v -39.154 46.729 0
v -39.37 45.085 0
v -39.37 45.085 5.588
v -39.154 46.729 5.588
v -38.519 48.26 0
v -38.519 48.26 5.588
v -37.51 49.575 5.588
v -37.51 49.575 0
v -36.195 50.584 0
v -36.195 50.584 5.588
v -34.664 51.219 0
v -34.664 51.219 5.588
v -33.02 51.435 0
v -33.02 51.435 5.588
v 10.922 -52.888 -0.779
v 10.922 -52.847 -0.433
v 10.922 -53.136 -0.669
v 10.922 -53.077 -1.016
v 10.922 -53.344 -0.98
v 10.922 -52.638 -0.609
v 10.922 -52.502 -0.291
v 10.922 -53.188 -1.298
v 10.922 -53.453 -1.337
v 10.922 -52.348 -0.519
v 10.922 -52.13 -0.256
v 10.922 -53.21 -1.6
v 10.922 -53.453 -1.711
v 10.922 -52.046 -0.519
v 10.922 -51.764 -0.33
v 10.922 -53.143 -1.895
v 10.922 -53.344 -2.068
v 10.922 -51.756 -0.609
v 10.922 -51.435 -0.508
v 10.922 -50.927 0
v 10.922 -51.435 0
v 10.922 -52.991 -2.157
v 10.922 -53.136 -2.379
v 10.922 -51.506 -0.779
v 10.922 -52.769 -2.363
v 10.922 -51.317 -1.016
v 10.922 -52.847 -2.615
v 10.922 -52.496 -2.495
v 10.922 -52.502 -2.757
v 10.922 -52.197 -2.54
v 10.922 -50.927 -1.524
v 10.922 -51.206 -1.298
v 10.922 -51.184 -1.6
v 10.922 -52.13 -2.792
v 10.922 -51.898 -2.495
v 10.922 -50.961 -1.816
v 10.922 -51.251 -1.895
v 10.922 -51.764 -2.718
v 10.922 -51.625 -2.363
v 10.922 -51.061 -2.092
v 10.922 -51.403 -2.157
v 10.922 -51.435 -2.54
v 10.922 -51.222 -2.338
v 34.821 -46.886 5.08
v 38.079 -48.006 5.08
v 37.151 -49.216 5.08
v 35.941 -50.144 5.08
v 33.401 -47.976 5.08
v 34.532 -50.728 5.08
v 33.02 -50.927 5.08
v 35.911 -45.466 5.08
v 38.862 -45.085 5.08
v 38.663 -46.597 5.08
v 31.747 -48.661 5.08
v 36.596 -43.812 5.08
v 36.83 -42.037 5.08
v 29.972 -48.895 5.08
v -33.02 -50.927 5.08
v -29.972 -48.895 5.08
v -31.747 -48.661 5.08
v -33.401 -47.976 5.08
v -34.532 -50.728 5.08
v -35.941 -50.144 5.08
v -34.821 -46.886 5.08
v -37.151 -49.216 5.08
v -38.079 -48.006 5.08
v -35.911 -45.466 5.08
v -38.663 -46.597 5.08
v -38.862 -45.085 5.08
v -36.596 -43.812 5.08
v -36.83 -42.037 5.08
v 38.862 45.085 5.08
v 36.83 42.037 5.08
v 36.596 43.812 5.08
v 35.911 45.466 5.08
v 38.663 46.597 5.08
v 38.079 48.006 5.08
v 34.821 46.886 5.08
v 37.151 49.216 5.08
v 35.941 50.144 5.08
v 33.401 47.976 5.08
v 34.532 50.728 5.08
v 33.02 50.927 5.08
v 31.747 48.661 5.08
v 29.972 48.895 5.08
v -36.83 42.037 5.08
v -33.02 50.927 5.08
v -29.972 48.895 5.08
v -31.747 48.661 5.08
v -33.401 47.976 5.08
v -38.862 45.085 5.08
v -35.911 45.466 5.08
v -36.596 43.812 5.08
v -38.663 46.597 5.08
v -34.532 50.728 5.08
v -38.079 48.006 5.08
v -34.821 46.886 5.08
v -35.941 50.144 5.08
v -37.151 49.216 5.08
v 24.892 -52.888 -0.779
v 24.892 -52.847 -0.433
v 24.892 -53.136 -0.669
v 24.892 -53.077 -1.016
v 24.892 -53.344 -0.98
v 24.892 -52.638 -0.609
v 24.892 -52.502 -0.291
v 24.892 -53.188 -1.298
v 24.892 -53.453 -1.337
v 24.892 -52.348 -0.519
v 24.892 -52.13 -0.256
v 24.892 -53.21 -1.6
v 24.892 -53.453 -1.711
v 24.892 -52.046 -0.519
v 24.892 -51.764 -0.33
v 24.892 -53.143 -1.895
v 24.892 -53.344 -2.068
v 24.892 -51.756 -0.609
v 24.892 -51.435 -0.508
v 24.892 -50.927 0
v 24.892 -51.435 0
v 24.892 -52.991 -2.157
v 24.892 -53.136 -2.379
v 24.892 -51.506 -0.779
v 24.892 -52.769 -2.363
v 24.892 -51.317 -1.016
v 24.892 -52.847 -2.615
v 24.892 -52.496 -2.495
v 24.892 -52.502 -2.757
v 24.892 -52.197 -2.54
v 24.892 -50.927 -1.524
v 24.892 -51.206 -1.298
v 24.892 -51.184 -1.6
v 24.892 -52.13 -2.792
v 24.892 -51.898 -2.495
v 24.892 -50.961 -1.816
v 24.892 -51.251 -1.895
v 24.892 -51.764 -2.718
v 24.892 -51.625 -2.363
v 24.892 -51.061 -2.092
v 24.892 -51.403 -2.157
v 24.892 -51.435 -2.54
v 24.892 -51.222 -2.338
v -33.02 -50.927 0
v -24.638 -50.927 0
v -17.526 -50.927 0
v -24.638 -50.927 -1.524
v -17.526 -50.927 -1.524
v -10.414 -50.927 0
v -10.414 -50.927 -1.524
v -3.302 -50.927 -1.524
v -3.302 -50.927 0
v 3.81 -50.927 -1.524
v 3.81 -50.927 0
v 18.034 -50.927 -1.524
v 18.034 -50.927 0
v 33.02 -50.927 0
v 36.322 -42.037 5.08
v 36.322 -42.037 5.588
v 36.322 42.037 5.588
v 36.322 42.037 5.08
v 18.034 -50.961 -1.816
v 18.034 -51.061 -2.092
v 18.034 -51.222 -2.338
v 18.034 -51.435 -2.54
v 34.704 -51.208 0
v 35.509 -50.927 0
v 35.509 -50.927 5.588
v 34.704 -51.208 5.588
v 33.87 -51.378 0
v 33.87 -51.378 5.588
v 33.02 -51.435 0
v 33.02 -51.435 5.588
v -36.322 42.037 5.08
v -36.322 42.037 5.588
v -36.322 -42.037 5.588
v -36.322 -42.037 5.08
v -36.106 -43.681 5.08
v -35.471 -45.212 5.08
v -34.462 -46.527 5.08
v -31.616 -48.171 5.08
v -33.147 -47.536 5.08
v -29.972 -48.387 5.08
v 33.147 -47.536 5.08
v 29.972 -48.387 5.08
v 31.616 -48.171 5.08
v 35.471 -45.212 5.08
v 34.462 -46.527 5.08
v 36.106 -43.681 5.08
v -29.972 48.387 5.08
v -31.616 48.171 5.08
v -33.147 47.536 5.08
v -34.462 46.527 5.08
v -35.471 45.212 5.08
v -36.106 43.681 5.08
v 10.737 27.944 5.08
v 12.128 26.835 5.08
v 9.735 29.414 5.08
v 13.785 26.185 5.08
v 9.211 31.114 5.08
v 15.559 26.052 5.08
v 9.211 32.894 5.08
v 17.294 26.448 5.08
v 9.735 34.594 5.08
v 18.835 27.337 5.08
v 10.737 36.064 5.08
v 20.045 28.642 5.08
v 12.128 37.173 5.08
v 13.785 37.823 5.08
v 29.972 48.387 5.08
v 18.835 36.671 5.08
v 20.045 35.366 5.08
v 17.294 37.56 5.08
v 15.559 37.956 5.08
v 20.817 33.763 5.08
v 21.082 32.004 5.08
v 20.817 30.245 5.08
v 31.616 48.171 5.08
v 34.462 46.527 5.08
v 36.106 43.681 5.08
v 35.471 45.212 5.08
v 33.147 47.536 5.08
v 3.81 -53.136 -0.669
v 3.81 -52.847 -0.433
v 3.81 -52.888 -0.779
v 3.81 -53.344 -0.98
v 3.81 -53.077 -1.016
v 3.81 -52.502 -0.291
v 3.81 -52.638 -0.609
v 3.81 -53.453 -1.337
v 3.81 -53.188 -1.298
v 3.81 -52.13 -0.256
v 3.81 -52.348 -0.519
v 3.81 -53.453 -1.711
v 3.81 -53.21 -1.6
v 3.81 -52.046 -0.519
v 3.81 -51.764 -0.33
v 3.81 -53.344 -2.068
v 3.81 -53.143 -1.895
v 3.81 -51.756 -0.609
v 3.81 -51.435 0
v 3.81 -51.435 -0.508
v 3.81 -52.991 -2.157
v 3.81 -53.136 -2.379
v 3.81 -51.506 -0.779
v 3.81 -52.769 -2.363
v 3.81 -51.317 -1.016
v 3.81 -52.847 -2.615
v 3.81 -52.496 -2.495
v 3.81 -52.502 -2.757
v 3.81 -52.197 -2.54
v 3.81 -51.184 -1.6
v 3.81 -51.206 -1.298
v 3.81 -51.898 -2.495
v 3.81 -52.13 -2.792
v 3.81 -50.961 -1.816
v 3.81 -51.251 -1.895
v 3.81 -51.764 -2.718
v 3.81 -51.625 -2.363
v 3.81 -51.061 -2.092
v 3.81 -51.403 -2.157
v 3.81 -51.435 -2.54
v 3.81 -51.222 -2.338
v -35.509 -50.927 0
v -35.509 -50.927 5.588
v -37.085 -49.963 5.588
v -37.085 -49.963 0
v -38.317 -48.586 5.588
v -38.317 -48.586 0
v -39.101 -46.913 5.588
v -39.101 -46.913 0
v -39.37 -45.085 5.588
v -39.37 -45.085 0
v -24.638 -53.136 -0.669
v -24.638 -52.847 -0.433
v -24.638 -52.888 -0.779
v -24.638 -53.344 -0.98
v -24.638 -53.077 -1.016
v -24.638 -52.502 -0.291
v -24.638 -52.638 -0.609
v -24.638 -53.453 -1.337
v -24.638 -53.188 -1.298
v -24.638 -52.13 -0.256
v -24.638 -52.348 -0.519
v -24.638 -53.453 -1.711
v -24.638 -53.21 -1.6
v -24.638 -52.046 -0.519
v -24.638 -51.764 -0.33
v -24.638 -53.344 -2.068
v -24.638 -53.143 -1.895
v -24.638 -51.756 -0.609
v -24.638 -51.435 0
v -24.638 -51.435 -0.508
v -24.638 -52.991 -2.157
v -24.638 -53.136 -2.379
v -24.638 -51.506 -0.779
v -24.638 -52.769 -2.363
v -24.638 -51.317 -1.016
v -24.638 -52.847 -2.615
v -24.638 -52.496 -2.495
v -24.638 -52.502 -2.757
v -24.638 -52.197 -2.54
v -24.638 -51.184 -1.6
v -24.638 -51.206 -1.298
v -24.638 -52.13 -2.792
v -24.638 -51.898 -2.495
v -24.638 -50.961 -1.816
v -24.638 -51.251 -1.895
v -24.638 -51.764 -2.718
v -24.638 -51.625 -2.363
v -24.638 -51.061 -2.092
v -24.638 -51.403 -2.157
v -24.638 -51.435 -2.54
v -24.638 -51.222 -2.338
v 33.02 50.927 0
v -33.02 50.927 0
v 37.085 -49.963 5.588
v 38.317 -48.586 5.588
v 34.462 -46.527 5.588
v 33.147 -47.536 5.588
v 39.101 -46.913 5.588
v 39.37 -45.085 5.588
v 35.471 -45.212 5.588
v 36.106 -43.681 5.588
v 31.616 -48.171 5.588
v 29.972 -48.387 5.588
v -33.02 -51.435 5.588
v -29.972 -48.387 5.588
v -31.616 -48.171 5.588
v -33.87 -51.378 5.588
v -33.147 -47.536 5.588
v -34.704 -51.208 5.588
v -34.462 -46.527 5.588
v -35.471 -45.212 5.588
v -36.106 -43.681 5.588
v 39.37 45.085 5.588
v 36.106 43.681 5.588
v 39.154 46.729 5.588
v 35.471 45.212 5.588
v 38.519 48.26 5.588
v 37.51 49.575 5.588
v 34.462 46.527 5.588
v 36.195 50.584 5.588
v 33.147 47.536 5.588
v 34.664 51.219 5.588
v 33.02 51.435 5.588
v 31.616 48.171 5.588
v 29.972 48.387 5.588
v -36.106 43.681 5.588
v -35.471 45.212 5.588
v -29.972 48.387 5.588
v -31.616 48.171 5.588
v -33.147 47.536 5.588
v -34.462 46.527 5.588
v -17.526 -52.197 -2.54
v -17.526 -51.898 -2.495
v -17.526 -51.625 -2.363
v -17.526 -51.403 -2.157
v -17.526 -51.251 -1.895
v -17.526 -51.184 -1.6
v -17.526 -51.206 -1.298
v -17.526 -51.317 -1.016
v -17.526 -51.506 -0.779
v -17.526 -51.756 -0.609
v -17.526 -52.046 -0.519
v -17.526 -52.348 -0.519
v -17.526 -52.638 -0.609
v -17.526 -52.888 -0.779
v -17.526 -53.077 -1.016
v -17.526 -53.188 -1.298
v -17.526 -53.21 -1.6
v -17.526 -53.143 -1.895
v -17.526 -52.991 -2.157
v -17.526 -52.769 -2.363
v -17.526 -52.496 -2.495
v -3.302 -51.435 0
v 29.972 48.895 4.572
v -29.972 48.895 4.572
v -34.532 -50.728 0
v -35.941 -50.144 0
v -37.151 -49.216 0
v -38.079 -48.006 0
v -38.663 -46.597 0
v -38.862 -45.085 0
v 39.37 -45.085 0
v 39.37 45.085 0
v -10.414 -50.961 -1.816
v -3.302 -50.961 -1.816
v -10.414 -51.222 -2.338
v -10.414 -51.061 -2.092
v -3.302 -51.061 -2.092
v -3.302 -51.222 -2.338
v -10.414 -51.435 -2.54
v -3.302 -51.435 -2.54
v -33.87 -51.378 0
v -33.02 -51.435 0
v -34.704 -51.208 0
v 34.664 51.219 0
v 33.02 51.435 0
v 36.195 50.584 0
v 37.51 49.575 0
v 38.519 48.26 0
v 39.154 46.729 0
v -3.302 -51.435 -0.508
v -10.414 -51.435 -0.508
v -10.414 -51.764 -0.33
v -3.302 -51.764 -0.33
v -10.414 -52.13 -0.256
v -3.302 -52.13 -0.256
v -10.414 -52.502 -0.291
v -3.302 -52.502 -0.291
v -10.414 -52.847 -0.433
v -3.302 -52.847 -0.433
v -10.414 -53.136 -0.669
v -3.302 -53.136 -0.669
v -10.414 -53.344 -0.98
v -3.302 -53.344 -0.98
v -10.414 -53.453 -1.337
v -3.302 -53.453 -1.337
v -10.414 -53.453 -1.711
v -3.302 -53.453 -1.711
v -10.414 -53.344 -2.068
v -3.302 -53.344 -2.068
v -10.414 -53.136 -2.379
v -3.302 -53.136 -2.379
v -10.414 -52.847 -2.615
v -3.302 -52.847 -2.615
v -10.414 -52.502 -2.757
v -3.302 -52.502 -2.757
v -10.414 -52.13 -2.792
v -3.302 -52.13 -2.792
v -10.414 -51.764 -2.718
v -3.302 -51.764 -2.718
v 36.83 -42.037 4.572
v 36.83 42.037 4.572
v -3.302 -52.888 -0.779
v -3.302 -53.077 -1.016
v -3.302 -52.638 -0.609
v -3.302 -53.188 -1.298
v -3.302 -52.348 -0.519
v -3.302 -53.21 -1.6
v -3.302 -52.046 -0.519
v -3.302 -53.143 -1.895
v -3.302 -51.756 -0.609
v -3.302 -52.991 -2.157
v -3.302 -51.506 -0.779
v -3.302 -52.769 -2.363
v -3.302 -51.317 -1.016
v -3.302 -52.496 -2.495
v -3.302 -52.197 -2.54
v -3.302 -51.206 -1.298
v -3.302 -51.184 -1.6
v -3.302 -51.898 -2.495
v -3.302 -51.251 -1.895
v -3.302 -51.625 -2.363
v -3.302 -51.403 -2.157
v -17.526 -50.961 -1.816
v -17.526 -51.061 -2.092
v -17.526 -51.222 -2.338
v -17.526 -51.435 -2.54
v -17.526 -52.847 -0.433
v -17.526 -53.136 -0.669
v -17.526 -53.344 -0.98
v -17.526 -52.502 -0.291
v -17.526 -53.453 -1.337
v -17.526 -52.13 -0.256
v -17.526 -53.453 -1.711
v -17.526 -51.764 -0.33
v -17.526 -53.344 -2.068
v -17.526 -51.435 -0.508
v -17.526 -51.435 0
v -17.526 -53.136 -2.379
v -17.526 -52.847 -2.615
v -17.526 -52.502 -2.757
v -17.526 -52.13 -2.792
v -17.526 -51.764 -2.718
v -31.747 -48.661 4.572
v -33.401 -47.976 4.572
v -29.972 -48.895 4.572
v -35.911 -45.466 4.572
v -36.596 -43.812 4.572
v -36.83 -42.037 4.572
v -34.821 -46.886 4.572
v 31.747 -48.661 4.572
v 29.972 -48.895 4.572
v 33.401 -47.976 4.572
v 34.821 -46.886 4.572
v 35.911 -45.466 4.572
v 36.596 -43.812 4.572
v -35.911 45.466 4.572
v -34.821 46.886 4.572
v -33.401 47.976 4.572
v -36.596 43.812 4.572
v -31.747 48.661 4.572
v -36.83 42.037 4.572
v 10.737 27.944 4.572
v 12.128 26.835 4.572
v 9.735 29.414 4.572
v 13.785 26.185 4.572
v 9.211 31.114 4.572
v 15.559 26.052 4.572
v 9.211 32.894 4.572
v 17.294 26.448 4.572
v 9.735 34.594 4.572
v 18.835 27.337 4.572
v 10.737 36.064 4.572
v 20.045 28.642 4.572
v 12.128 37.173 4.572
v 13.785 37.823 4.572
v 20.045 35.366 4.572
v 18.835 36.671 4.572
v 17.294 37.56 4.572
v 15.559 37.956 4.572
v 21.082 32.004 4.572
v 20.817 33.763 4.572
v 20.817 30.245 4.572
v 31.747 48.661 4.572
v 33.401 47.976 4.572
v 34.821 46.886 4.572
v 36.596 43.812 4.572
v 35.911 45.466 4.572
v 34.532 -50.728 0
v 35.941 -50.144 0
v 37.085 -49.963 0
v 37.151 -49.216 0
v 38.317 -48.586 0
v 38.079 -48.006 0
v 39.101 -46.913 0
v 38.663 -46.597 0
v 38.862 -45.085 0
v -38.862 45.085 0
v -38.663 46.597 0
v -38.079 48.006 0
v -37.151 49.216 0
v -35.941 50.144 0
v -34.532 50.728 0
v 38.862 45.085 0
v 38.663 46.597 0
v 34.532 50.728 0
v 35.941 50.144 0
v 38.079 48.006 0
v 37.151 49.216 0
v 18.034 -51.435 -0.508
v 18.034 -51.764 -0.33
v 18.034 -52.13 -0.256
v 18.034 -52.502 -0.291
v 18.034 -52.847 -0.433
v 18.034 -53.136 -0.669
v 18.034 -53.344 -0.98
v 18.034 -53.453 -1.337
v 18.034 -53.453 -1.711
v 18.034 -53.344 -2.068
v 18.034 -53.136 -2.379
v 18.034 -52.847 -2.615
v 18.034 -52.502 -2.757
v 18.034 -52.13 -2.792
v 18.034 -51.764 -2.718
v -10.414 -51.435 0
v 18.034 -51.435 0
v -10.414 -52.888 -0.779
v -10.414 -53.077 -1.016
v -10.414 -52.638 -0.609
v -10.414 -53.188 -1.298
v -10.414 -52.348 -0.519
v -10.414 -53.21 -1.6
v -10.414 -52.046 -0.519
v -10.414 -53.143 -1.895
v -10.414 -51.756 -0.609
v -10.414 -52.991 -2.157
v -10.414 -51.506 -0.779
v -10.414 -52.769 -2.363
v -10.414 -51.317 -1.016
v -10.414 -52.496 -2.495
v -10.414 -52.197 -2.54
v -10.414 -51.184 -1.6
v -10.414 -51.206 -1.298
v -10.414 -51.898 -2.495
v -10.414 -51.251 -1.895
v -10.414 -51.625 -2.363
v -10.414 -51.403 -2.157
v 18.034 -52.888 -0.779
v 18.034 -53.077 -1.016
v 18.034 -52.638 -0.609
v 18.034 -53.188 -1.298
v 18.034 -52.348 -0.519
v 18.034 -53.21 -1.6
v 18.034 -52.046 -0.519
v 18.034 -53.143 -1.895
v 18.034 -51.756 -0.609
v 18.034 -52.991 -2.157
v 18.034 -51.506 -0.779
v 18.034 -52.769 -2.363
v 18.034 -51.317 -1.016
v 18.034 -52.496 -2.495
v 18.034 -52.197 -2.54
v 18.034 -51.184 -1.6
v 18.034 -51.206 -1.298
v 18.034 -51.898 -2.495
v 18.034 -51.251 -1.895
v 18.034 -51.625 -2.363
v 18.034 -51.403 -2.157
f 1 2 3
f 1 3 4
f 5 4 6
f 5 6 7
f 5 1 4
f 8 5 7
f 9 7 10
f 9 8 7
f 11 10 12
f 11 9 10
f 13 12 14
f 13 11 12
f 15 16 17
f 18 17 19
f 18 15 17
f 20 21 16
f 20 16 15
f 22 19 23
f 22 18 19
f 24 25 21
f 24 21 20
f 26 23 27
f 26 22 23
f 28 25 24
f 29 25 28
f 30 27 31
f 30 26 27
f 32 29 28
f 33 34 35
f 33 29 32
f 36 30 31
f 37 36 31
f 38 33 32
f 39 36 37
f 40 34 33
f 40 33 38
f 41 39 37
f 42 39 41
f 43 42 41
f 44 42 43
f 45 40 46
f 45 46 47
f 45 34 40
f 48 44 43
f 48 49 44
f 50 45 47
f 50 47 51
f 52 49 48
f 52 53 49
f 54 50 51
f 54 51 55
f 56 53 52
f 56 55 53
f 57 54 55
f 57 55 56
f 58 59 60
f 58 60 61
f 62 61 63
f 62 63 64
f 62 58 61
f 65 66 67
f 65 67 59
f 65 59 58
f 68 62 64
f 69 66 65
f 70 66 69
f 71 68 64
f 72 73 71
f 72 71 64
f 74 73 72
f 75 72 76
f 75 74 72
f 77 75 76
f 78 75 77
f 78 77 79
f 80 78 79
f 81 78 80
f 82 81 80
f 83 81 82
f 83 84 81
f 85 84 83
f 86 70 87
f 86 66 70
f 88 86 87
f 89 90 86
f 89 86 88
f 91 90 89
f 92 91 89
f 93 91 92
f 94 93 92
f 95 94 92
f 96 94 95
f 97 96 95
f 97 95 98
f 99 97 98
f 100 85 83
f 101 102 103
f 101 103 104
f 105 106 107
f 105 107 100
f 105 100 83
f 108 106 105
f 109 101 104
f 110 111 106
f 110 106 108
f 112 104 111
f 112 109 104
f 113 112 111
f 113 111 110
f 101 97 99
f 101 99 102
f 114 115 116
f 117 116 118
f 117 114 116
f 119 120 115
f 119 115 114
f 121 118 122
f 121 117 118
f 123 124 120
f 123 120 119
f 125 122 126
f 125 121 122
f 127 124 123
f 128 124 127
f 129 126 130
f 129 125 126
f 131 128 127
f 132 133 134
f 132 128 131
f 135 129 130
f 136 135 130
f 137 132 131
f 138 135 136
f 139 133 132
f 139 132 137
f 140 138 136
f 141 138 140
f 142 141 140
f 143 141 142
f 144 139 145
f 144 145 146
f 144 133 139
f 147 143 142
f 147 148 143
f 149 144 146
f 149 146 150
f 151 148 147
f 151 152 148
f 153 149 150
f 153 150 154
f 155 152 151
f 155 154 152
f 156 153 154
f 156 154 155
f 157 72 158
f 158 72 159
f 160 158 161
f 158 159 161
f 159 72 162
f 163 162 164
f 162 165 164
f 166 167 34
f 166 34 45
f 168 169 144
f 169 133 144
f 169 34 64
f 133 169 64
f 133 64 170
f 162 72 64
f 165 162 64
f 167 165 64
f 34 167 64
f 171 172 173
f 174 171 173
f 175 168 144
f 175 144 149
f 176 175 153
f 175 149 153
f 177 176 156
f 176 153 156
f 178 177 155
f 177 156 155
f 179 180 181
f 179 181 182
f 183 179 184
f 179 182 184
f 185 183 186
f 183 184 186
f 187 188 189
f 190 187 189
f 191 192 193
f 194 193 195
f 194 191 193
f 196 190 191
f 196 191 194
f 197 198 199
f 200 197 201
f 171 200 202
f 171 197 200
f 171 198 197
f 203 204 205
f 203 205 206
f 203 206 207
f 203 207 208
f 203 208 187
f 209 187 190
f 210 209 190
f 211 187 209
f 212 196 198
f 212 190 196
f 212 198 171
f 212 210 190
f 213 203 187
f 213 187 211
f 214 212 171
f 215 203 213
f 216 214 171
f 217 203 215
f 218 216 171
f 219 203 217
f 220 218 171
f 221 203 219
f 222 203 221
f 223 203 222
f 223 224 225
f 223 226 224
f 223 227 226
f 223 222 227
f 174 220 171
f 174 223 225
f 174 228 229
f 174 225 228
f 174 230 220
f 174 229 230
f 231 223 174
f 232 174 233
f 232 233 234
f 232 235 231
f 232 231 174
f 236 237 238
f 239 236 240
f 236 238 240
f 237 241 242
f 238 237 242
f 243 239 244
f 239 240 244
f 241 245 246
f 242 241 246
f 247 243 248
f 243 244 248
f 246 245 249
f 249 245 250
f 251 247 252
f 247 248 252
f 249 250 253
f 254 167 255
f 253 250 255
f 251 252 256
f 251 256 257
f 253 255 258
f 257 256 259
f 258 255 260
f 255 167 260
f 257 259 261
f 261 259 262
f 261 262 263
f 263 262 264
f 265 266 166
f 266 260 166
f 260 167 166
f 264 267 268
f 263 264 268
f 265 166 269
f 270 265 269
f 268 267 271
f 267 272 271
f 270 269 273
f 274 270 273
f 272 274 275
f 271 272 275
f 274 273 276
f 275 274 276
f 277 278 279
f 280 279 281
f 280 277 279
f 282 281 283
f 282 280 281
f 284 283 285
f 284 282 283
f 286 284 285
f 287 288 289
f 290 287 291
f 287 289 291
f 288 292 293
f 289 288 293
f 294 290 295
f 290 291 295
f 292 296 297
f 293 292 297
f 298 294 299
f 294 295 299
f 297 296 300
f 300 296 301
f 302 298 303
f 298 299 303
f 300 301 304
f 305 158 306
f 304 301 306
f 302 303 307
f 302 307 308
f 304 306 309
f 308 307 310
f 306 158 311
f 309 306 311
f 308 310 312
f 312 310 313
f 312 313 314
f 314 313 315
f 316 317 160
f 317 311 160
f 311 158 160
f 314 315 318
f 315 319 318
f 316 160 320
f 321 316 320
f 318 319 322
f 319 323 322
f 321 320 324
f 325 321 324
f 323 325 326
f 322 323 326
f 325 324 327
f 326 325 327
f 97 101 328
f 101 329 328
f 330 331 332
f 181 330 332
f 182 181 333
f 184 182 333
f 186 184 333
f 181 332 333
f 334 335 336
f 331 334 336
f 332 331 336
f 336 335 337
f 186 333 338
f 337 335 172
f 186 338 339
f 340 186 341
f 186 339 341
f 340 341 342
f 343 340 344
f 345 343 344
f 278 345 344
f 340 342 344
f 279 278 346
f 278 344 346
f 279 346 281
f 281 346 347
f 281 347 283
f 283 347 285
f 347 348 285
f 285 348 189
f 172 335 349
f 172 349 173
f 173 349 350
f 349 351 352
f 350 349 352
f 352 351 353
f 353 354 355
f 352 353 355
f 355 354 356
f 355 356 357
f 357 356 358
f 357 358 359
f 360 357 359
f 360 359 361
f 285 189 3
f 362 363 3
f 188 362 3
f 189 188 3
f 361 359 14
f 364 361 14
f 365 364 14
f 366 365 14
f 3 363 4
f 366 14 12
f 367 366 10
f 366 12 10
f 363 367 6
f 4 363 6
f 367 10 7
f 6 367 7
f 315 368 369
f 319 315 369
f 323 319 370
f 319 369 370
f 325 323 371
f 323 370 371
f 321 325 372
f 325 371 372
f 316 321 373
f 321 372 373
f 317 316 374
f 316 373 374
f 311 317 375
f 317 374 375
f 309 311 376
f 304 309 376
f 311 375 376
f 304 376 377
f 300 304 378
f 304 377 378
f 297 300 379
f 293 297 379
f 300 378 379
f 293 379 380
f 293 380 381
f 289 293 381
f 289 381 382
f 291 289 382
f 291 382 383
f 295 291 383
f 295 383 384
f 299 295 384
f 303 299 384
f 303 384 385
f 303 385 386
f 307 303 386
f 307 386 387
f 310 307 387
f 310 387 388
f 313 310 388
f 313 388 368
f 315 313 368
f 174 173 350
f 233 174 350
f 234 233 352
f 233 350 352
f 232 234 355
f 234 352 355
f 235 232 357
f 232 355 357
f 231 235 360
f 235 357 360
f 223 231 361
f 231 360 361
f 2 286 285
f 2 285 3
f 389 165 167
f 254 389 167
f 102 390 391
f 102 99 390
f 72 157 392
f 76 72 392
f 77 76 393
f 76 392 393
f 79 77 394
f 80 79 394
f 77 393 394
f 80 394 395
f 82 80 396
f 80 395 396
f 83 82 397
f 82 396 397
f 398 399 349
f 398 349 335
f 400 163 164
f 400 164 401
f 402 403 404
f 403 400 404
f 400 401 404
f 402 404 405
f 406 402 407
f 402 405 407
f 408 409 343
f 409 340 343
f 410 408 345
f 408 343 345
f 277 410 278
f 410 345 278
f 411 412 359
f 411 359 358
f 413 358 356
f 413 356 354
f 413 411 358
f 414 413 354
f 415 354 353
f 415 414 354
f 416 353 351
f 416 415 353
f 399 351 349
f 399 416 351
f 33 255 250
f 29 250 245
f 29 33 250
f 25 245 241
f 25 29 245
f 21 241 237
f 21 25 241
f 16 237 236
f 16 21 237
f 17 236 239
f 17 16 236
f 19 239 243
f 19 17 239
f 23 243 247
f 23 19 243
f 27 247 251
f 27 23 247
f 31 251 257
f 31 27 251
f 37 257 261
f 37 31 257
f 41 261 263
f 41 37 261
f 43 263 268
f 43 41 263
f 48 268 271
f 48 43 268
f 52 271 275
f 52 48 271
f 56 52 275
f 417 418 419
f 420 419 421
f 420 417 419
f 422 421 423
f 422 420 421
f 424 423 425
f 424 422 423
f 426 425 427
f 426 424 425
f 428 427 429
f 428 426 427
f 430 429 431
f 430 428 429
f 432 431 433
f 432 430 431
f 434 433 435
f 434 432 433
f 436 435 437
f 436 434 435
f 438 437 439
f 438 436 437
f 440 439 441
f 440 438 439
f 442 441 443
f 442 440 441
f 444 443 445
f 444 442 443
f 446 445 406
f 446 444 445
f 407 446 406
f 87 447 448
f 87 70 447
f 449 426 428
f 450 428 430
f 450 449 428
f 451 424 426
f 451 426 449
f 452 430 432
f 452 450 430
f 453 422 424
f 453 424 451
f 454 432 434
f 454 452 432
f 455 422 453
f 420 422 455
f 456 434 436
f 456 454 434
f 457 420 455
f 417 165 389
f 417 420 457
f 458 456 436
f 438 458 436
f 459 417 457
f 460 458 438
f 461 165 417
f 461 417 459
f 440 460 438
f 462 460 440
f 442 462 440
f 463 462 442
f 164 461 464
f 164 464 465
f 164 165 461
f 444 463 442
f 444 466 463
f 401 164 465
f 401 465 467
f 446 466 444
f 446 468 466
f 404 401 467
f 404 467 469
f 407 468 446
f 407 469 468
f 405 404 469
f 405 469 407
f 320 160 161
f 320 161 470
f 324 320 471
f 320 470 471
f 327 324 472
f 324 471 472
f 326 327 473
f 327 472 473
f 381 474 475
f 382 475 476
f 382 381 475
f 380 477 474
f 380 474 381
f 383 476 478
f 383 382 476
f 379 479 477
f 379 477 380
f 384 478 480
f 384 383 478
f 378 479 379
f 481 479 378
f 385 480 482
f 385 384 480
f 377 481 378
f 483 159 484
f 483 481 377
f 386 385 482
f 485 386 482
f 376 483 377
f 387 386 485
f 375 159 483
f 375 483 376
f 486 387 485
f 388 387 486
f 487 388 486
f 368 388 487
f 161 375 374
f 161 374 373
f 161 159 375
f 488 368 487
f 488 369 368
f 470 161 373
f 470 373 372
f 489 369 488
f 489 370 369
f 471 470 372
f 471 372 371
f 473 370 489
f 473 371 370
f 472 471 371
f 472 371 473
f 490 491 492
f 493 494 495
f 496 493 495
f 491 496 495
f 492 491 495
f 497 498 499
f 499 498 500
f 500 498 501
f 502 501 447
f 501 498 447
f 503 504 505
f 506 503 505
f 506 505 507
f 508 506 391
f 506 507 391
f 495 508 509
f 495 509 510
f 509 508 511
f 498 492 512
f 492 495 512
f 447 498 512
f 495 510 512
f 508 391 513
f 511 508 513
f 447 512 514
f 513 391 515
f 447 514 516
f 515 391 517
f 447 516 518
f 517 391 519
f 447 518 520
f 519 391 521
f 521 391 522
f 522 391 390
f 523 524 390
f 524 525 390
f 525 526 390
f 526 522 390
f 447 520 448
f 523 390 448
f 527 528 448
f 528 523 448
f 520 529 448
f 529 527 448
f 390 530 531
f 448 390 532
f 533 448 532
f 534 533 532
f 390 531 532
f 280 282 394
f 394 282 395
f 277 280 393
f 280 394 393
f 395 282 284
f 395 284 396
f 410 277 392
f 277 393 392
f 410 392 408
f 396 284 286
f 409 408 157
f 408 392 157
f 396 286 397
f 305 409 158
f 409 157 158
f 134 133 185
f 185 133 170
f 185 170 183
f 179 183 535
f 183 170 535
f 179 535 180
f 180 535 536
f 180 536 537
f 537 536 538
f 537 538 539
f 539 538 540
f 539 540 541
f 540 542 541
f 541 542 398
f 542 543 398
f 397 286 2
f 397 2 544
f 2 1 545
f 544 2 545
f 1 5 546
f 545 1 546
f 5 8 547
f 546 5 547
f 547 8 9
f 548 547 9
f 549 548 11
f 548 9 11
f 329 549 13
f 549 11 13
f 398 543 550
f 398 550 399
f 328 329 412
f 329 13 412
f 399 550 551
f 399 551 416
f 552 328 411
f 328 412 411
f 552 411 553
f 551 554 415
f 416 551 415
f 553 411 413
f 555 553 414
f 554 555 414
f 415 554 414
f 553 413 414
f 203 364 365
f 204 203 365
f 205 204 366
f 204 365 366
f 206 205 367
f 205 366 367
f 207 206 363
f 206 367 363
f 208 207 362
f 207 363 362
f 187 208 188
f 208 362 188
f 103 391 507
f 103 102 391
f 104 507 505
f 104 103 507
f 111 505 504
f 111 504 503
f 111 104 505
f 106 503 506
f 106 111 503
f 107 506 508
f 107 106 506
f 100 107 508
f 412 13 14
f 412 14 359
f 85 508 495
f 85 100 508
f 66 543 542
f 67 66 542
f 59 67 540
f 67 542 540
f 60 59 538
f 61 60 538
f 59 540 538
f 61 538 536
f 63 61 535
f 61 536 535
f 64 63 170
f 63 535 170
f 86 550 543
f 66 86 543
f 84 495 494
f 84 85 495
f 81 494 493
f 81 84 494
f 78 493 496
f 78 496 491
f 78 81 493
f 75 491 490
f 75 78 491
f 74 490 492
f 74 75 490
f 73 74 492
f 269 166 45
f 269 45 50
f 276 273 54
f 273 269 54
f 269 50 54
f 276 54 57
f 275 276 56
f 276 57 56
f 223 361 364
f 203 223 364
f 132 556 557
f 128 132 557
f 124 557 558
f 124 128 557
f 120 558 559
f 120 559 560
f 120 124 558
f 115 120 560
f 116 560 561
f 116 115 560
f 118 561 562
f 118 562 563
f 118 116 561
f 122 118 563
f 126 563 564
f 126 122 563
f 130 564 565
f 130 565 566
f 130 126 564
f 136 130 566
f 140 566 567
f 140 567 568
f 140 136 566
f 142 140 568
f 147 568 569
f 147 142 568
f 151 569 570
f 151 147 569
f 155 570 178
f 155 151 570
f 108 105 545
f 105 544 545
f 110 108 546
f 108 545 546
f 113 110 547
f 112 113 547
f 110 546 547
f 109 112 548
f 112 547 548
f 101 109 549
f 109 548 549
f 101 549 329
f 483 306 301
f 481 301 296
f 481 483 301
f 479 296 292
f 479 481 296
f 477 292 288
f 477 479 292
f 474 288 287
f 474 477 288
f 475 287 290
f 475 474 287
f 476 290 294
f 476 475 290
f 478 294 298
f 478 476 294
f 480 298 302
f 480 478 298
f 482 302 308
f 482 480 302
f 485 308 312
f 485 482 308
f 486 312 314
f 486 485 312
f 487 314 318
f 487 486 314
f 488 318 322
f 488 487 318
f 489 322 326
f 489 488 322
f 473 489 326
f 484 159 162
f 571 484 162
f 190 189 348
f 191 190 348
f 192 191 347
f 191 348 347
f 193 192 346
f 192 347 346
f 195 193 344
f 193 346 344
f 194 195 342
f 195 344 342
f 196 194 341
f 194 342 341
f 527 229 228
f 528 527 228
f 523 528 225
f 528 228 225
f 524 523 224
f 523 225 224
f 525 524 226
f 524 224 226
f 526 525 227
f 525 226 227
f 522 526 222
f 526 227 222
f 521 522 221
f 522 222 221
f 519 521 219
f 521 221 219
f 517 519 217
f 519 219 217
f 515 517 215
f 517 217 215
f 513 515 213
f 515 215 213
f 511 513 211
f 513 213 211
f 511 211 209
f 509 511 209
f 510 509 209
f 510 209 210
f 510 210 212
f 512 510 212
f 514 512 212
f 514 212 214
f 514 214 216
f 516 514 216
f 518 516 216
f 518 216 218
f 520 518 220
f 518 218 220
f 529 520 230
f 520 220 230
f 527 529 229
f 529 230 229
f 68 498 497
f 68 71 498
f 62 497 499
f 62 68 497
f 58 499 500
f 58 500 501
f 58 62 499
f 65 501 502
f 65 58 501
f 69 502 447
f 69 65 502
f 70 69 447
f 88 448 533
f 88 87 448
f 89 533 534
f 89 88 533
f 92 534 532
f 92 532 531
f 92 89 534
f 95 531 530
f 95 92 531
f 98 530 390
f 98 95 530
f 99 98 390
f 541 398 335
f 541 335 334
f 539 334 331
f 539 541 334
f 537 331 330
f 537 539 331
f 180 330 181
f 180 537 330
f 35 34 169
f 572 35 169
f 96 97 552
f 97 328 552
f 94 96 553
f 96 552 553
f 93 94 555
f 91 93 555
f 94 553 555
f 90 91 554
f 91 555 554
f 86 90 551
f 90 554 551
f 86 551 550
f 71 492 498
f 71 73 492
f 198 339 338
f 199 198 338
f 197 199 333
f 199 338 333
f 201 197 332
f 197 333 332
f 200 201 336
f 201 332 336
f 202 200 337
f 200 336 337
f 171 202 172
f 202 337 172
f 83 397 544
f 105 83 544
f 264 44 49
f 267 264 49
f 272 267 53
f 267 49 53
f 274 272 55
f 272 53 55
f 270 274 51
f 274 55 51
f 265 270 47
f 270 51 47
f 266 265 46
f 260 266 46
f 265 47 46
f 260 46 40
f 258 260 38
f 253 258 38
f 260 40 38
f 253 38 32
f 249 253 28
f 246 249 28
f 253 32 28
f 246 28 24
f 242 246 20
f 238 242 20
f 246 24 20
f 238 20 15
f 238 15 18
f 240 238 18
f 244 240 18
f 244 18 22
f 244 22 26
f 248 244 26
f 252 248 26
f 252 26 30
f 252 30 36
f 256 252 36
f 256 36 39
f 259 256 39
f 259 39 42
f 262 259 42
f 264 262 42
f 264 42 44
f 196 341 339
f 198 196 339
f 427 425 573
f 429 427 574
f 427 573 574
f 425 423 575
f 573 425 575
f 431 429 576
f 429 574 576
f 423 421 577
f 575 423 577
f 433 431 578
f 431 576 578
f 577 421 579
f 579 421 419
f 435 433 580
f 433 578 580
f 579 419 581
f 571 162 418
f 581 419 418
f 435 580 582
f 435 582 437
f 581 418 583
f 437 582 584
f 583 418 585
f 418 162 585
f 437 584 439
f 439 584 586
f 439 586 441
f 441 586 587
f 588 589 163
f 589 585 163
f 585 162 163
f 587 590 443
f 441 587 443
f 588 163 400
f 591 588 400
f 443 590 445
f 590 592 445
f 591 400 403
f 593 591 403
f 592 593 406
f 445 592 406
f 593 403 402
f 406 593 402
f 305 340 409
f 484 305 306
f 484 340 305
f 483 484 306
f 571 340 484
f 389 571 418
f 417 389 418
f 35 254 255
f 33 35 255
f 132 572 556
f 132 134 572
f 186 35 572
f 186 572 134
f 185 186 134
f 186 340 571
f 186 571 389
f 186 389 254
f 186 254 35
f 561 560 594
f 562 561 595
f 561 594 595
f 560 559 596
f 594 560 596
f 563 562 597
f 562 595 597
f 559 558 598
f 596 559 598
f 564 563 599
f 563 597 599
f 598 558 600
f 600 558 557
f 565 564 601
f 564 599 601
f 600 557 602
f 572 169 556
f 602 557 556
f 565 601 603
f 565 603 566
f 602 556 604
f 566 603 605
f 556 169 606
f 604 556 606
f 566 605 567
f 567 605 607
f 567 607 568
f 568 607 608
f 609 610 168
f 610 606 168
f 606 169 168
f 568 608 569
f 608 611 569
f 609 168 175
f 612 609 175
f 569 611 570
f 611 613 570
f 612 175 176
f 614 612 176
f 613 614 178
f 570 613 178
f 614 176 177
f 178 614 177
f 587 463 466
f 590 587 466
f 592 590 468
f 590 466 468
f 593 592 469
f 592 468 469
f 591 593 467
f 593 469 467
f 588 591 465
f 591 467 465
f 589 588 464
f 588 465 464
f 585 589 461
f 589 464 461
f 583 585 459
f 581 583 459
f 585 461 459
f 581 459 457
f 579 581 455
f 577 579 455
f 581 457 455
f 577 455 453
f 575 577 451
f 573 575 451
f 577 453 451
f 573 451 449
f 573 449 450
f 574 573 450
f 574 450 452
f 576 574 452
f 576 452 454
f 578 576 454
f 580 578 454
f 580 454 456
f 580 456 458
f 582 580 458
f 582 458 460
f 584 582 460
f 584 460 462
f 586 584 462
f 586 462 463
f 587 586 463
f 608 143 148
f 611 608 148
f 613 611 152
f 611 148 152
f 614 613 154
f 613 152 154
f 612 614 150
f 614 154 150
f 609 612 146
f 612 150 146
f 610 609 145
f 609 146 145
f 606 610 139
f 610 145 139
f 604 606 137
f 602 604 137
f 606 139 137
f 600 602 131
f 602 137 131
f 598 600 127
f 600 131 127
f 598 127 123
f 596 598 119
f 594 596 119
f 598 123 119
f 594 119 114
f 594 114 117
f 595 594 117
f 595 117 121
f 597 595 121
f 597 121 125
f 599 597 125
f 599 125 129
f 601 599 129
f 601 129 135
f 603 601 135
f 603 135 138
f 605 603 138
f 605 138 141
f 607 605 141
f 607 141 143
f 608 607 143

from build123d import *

# Parameters (mm, degrees)
BOSS_EXTRUDE1_DEPTH = 5.588
CUT_EXTRUDE1_DEPTH  = 0.508
SHELL2_T            = -0.508
SKETCH3_R           = 5.969
CUT_EXTRUDE2_DEPTH  = 0.508
SKETCH5_W           = 2.54
SKETCH5_H           = 0.508
BOSS_EXTRUDE2_DEPTH = 76.708
SKETCH7_R           = 1.27
BOSS_EXTRUDE3_DEPTH = 76.708
CUT_EXTRUDE3_DEPTH  = 79.74
SKETCH9_R           = 1.016
CUT_EXTRUDE4_DEPTH  = 79.74
SKETCH10_W          = 7.112
SKETCH10_H          = 2.032
SKETCH10_W_2        = 12.7
CUT_EXTRUDE5_DEPTH  = 9.382
SKETCH11_W          = 10.616681579
SKETCH11_H          = 2.54
SKETCH11_W_2        = 10.870681579
CUT_EXTRUDE6_DEPTH  = 3.5400001
SKETCH12_W          = 7.112
SKETCH12_H          = 2.54
CUT_EXTRUDE7_DEPTH  = 3.54


with BuildPart() as part:
    # Sketch1 → Boss-Extrude1 (new body)
    with BuildSketch(Plane.XY):
        with BuildLine():
            Line((-33.02, 51.435), (33.02, 51.435))
            ThreePointArc((33.02, 51.435), (37.510128061, 49.575128061), (39.37, 45.085))
            Line((39.37, 45.085), (39.37, -45.085))
            ThreePointArc((39.37, -45.085), (37.510128061, -49.575128061), (33.02, -51.435))
            Line((33.02, -51.435), (-33.02, -51.435))
            ThreePointArc((-33.02, -51.435), (-37.510128061, -49.575128061), (-39.37, -45.085))
            Line((-39.37, -45.085), (-39.37, 45.085))
            ThreePointArc((-39.37, 45.085), (-37.510128061, 49.575128061), (-33.02, 51.435))
        make_face()
    extrude(amount=BOSS_EXTRUDE1_DEPTH)

    # Sketch2 → Cut-Extrude1 (cut)
    with BuildSketch(Plane.XY.offset(5.588)):
        with BuildLine():
            Line((-29.972, -48.387), (29.972, -48.387))
            ThreePointArc((29.972, -48.387), (34.462128061, -46.527128061), (36.322, -42.037))
            Line((36.322, -42.037), (36.322, 42.037))
            ThreePointArc((36.322, 42.037), (34.462128061, 46.527128061), (29.972, 48.387))
            Line((29.972, 48.387), (-29.972, 48.387))
            ThreePointArc((-29.972, 48.387), (-34.462128061, 46.527128061), (-36.322, 42.037))
            Line((-36.322, 42.037), (-36.322, -42.037))
            ThreePointArc((-36.322, -42.037), (-34.462128061, -46.527128061), (-29.972, -48.387))
        make_face()
    extrude(amount=-CUT_EXTRUDE1_DEPTH, mode=Mode.SUBTRACT)

    # Shell2
    shell2_openings = [part.faces().sort_by_distance(p)[0] for p in [
        (0, 0, 0),
    ]]
    offset(amount=SHELL2_T, openings=shell2_openings, kind=Kind.INTERSECTION)

    # Sketch3 → Cut-Extrude2 (cut)
    with BuildSketch(Plane.XY.offset(5.08)):
        with Locations((15.113, 32.004)):
            Circle(SKETCH3_R)
    extrude(amount=-CUT_EXTRUDE2_DEPTH, mode=Mode.SUBTRACT)

    # Sketch5 → Boss-Extrude2 (add)
    with BuildSketch(Plane(origin=(39.37, 0, 0), x_dir=(0, 0, -1), z_dir=(1, 0, 0))):
        with Locations((1.27, -51.181)):
            Rectangle(SKETCH5_W, SKETCH5_H)
    extrude(amount=-BOSS_EXTRUDE2_DEPTH)

    # Sketch7 → Boss-Extrude3 (add)
    with BuildSketch(Plane(origin=(39.37, 0, 0), x_dir=(0, 0, -1), z_dir=(1, 0, 0))):
        with Locations((1.524, -52.197)):
            Circle(SKETCH7_R)
    extrude(amount=-BOSS_EXTRUDE3_DEPTH)

    # Sketch8 → Cut-Extrude3 (cut, through all)
    with BuildSketch(Plane(origin=(39.37, 0, 0), x_dir=(0, 0, -1), z_dir=(1, 0, 0))):
        with BuildLine():
            Line((2.54, -50.927), (1.524, -50.927))
            ThreePointArc((1.524, -50.927), (2.091961266, -51.061077467), (2.54, -51.435))
            Line((2.54, -51.435), (2.54, -50.927))
        make_face()
    extrude(amount=-CUT_EXTRUDE3_DEPTH, mode=Mode.SUBTRACT)

    # Sketch9 → Cut-Extrude4 (cut, through all)
    with BuildSketch(Plane(origin=(39.37, 0, 0), x_dir=(0, 0, -1), z_dir=(1, 0, 0))):
        with Locations((1.524, -52.197)):
            Circle(SKETCH9_R)
    extrude(amount=-CUT_EXTRUDE4_DEPTH, mode=Mode.SUBTRACT)

    # Sketch10 → Cut-Extrude5 (cut, through all)
    with BuildSketch(Plane.XY.offset(5.588)):
        with Locations((-13.97, -52.451)):
            Rectangle(SKETCH10_W, SKETCH10_H)
        with Locations((0.254, -52.451)):
            Rectangle(SKETCH10_W, SKETCH10_H)
        with Locations((14.478, -52.451)):
            Rectangle(SKETCH10_W, SKETCH10_H)
        Polygon((39.37, -54.461005148), (39.37, -51.435), (33.02, -51.435), (24.892, -51.435), (24.892, -54.461005148), align=None)
        with Locations((-30.988, -52.451)):
            Rectangle(SKETCH10_W_2, SKETCH10_H)
        with BuildLine():
            Line((-35.508681579, -50.927), (-37.338, -50.927))
            Line((-37.338, -50.927), (-37.338, -51.435))
            Line((-37.338, -51.435), (-33.02, -51.435))
            ThreePointArc((-33.02, -51.435), (-34.29, -51.306703947), (-35.508681579, -50.927))
        make_face()
        with BuildLine():
            Line((39.37, -50.927), (35.508681579, -50.927))
            ThreePointArc((35.508681579, -50.927), (34.29, -51.306703947), (33.02, -51.435))
            Line((33.02, -51.435), (39.37, -51.435))
            Line((39.37, -51.435), (39.37, -50.927))
        make_face()
    extrude(amount=-CUT_EXTRUDE5_DEPTH, mode=Mode.SUBTRACT)

    # Sketch11 → Cut-Extrude6 (cut, through all)
    with BuildSketch(Plane(origin=(0, -50.927, 0), x_dir=(1, 0, 0), z_dir=(0, 1, 0))):
        with Locations((30.20034079, 1.27)):
            Rectangle(SKETCH11_W, SKETCH11_H)
        with Locations((-30.07334079, 1.27)):
            Rectangle(SKETCH11_W_2, SKETCH11_H)
    extrude(amount=-CUT_EXTRUDE6_DEPTH, mode=Mode.SUBTRACT)

    # Sketch12 → Cut-Extrude7 (cut, through all)
    with BuildSketch(Plane(origin=(0, -50.927, 0), x_dir=(1, 0, 0), z_dir=(0, 1, 0))):
        with Locations((14.478, 1.27)):
            Rectangle(SKETCH12_W, SKETCH12_H)
        with Locations((0.254, 1.27)):
            Rectangle(SKETCH12_W, SKETCH12_H)
        with Locations((-13.97, 1.27)):
            Rectangle(SKETCH12_W, SKETCH12_H)
    extrude(amount=-CUT_EXTRUDE7_DEPTH, mode=Mode.SUBTRACT)


solid = part.part
